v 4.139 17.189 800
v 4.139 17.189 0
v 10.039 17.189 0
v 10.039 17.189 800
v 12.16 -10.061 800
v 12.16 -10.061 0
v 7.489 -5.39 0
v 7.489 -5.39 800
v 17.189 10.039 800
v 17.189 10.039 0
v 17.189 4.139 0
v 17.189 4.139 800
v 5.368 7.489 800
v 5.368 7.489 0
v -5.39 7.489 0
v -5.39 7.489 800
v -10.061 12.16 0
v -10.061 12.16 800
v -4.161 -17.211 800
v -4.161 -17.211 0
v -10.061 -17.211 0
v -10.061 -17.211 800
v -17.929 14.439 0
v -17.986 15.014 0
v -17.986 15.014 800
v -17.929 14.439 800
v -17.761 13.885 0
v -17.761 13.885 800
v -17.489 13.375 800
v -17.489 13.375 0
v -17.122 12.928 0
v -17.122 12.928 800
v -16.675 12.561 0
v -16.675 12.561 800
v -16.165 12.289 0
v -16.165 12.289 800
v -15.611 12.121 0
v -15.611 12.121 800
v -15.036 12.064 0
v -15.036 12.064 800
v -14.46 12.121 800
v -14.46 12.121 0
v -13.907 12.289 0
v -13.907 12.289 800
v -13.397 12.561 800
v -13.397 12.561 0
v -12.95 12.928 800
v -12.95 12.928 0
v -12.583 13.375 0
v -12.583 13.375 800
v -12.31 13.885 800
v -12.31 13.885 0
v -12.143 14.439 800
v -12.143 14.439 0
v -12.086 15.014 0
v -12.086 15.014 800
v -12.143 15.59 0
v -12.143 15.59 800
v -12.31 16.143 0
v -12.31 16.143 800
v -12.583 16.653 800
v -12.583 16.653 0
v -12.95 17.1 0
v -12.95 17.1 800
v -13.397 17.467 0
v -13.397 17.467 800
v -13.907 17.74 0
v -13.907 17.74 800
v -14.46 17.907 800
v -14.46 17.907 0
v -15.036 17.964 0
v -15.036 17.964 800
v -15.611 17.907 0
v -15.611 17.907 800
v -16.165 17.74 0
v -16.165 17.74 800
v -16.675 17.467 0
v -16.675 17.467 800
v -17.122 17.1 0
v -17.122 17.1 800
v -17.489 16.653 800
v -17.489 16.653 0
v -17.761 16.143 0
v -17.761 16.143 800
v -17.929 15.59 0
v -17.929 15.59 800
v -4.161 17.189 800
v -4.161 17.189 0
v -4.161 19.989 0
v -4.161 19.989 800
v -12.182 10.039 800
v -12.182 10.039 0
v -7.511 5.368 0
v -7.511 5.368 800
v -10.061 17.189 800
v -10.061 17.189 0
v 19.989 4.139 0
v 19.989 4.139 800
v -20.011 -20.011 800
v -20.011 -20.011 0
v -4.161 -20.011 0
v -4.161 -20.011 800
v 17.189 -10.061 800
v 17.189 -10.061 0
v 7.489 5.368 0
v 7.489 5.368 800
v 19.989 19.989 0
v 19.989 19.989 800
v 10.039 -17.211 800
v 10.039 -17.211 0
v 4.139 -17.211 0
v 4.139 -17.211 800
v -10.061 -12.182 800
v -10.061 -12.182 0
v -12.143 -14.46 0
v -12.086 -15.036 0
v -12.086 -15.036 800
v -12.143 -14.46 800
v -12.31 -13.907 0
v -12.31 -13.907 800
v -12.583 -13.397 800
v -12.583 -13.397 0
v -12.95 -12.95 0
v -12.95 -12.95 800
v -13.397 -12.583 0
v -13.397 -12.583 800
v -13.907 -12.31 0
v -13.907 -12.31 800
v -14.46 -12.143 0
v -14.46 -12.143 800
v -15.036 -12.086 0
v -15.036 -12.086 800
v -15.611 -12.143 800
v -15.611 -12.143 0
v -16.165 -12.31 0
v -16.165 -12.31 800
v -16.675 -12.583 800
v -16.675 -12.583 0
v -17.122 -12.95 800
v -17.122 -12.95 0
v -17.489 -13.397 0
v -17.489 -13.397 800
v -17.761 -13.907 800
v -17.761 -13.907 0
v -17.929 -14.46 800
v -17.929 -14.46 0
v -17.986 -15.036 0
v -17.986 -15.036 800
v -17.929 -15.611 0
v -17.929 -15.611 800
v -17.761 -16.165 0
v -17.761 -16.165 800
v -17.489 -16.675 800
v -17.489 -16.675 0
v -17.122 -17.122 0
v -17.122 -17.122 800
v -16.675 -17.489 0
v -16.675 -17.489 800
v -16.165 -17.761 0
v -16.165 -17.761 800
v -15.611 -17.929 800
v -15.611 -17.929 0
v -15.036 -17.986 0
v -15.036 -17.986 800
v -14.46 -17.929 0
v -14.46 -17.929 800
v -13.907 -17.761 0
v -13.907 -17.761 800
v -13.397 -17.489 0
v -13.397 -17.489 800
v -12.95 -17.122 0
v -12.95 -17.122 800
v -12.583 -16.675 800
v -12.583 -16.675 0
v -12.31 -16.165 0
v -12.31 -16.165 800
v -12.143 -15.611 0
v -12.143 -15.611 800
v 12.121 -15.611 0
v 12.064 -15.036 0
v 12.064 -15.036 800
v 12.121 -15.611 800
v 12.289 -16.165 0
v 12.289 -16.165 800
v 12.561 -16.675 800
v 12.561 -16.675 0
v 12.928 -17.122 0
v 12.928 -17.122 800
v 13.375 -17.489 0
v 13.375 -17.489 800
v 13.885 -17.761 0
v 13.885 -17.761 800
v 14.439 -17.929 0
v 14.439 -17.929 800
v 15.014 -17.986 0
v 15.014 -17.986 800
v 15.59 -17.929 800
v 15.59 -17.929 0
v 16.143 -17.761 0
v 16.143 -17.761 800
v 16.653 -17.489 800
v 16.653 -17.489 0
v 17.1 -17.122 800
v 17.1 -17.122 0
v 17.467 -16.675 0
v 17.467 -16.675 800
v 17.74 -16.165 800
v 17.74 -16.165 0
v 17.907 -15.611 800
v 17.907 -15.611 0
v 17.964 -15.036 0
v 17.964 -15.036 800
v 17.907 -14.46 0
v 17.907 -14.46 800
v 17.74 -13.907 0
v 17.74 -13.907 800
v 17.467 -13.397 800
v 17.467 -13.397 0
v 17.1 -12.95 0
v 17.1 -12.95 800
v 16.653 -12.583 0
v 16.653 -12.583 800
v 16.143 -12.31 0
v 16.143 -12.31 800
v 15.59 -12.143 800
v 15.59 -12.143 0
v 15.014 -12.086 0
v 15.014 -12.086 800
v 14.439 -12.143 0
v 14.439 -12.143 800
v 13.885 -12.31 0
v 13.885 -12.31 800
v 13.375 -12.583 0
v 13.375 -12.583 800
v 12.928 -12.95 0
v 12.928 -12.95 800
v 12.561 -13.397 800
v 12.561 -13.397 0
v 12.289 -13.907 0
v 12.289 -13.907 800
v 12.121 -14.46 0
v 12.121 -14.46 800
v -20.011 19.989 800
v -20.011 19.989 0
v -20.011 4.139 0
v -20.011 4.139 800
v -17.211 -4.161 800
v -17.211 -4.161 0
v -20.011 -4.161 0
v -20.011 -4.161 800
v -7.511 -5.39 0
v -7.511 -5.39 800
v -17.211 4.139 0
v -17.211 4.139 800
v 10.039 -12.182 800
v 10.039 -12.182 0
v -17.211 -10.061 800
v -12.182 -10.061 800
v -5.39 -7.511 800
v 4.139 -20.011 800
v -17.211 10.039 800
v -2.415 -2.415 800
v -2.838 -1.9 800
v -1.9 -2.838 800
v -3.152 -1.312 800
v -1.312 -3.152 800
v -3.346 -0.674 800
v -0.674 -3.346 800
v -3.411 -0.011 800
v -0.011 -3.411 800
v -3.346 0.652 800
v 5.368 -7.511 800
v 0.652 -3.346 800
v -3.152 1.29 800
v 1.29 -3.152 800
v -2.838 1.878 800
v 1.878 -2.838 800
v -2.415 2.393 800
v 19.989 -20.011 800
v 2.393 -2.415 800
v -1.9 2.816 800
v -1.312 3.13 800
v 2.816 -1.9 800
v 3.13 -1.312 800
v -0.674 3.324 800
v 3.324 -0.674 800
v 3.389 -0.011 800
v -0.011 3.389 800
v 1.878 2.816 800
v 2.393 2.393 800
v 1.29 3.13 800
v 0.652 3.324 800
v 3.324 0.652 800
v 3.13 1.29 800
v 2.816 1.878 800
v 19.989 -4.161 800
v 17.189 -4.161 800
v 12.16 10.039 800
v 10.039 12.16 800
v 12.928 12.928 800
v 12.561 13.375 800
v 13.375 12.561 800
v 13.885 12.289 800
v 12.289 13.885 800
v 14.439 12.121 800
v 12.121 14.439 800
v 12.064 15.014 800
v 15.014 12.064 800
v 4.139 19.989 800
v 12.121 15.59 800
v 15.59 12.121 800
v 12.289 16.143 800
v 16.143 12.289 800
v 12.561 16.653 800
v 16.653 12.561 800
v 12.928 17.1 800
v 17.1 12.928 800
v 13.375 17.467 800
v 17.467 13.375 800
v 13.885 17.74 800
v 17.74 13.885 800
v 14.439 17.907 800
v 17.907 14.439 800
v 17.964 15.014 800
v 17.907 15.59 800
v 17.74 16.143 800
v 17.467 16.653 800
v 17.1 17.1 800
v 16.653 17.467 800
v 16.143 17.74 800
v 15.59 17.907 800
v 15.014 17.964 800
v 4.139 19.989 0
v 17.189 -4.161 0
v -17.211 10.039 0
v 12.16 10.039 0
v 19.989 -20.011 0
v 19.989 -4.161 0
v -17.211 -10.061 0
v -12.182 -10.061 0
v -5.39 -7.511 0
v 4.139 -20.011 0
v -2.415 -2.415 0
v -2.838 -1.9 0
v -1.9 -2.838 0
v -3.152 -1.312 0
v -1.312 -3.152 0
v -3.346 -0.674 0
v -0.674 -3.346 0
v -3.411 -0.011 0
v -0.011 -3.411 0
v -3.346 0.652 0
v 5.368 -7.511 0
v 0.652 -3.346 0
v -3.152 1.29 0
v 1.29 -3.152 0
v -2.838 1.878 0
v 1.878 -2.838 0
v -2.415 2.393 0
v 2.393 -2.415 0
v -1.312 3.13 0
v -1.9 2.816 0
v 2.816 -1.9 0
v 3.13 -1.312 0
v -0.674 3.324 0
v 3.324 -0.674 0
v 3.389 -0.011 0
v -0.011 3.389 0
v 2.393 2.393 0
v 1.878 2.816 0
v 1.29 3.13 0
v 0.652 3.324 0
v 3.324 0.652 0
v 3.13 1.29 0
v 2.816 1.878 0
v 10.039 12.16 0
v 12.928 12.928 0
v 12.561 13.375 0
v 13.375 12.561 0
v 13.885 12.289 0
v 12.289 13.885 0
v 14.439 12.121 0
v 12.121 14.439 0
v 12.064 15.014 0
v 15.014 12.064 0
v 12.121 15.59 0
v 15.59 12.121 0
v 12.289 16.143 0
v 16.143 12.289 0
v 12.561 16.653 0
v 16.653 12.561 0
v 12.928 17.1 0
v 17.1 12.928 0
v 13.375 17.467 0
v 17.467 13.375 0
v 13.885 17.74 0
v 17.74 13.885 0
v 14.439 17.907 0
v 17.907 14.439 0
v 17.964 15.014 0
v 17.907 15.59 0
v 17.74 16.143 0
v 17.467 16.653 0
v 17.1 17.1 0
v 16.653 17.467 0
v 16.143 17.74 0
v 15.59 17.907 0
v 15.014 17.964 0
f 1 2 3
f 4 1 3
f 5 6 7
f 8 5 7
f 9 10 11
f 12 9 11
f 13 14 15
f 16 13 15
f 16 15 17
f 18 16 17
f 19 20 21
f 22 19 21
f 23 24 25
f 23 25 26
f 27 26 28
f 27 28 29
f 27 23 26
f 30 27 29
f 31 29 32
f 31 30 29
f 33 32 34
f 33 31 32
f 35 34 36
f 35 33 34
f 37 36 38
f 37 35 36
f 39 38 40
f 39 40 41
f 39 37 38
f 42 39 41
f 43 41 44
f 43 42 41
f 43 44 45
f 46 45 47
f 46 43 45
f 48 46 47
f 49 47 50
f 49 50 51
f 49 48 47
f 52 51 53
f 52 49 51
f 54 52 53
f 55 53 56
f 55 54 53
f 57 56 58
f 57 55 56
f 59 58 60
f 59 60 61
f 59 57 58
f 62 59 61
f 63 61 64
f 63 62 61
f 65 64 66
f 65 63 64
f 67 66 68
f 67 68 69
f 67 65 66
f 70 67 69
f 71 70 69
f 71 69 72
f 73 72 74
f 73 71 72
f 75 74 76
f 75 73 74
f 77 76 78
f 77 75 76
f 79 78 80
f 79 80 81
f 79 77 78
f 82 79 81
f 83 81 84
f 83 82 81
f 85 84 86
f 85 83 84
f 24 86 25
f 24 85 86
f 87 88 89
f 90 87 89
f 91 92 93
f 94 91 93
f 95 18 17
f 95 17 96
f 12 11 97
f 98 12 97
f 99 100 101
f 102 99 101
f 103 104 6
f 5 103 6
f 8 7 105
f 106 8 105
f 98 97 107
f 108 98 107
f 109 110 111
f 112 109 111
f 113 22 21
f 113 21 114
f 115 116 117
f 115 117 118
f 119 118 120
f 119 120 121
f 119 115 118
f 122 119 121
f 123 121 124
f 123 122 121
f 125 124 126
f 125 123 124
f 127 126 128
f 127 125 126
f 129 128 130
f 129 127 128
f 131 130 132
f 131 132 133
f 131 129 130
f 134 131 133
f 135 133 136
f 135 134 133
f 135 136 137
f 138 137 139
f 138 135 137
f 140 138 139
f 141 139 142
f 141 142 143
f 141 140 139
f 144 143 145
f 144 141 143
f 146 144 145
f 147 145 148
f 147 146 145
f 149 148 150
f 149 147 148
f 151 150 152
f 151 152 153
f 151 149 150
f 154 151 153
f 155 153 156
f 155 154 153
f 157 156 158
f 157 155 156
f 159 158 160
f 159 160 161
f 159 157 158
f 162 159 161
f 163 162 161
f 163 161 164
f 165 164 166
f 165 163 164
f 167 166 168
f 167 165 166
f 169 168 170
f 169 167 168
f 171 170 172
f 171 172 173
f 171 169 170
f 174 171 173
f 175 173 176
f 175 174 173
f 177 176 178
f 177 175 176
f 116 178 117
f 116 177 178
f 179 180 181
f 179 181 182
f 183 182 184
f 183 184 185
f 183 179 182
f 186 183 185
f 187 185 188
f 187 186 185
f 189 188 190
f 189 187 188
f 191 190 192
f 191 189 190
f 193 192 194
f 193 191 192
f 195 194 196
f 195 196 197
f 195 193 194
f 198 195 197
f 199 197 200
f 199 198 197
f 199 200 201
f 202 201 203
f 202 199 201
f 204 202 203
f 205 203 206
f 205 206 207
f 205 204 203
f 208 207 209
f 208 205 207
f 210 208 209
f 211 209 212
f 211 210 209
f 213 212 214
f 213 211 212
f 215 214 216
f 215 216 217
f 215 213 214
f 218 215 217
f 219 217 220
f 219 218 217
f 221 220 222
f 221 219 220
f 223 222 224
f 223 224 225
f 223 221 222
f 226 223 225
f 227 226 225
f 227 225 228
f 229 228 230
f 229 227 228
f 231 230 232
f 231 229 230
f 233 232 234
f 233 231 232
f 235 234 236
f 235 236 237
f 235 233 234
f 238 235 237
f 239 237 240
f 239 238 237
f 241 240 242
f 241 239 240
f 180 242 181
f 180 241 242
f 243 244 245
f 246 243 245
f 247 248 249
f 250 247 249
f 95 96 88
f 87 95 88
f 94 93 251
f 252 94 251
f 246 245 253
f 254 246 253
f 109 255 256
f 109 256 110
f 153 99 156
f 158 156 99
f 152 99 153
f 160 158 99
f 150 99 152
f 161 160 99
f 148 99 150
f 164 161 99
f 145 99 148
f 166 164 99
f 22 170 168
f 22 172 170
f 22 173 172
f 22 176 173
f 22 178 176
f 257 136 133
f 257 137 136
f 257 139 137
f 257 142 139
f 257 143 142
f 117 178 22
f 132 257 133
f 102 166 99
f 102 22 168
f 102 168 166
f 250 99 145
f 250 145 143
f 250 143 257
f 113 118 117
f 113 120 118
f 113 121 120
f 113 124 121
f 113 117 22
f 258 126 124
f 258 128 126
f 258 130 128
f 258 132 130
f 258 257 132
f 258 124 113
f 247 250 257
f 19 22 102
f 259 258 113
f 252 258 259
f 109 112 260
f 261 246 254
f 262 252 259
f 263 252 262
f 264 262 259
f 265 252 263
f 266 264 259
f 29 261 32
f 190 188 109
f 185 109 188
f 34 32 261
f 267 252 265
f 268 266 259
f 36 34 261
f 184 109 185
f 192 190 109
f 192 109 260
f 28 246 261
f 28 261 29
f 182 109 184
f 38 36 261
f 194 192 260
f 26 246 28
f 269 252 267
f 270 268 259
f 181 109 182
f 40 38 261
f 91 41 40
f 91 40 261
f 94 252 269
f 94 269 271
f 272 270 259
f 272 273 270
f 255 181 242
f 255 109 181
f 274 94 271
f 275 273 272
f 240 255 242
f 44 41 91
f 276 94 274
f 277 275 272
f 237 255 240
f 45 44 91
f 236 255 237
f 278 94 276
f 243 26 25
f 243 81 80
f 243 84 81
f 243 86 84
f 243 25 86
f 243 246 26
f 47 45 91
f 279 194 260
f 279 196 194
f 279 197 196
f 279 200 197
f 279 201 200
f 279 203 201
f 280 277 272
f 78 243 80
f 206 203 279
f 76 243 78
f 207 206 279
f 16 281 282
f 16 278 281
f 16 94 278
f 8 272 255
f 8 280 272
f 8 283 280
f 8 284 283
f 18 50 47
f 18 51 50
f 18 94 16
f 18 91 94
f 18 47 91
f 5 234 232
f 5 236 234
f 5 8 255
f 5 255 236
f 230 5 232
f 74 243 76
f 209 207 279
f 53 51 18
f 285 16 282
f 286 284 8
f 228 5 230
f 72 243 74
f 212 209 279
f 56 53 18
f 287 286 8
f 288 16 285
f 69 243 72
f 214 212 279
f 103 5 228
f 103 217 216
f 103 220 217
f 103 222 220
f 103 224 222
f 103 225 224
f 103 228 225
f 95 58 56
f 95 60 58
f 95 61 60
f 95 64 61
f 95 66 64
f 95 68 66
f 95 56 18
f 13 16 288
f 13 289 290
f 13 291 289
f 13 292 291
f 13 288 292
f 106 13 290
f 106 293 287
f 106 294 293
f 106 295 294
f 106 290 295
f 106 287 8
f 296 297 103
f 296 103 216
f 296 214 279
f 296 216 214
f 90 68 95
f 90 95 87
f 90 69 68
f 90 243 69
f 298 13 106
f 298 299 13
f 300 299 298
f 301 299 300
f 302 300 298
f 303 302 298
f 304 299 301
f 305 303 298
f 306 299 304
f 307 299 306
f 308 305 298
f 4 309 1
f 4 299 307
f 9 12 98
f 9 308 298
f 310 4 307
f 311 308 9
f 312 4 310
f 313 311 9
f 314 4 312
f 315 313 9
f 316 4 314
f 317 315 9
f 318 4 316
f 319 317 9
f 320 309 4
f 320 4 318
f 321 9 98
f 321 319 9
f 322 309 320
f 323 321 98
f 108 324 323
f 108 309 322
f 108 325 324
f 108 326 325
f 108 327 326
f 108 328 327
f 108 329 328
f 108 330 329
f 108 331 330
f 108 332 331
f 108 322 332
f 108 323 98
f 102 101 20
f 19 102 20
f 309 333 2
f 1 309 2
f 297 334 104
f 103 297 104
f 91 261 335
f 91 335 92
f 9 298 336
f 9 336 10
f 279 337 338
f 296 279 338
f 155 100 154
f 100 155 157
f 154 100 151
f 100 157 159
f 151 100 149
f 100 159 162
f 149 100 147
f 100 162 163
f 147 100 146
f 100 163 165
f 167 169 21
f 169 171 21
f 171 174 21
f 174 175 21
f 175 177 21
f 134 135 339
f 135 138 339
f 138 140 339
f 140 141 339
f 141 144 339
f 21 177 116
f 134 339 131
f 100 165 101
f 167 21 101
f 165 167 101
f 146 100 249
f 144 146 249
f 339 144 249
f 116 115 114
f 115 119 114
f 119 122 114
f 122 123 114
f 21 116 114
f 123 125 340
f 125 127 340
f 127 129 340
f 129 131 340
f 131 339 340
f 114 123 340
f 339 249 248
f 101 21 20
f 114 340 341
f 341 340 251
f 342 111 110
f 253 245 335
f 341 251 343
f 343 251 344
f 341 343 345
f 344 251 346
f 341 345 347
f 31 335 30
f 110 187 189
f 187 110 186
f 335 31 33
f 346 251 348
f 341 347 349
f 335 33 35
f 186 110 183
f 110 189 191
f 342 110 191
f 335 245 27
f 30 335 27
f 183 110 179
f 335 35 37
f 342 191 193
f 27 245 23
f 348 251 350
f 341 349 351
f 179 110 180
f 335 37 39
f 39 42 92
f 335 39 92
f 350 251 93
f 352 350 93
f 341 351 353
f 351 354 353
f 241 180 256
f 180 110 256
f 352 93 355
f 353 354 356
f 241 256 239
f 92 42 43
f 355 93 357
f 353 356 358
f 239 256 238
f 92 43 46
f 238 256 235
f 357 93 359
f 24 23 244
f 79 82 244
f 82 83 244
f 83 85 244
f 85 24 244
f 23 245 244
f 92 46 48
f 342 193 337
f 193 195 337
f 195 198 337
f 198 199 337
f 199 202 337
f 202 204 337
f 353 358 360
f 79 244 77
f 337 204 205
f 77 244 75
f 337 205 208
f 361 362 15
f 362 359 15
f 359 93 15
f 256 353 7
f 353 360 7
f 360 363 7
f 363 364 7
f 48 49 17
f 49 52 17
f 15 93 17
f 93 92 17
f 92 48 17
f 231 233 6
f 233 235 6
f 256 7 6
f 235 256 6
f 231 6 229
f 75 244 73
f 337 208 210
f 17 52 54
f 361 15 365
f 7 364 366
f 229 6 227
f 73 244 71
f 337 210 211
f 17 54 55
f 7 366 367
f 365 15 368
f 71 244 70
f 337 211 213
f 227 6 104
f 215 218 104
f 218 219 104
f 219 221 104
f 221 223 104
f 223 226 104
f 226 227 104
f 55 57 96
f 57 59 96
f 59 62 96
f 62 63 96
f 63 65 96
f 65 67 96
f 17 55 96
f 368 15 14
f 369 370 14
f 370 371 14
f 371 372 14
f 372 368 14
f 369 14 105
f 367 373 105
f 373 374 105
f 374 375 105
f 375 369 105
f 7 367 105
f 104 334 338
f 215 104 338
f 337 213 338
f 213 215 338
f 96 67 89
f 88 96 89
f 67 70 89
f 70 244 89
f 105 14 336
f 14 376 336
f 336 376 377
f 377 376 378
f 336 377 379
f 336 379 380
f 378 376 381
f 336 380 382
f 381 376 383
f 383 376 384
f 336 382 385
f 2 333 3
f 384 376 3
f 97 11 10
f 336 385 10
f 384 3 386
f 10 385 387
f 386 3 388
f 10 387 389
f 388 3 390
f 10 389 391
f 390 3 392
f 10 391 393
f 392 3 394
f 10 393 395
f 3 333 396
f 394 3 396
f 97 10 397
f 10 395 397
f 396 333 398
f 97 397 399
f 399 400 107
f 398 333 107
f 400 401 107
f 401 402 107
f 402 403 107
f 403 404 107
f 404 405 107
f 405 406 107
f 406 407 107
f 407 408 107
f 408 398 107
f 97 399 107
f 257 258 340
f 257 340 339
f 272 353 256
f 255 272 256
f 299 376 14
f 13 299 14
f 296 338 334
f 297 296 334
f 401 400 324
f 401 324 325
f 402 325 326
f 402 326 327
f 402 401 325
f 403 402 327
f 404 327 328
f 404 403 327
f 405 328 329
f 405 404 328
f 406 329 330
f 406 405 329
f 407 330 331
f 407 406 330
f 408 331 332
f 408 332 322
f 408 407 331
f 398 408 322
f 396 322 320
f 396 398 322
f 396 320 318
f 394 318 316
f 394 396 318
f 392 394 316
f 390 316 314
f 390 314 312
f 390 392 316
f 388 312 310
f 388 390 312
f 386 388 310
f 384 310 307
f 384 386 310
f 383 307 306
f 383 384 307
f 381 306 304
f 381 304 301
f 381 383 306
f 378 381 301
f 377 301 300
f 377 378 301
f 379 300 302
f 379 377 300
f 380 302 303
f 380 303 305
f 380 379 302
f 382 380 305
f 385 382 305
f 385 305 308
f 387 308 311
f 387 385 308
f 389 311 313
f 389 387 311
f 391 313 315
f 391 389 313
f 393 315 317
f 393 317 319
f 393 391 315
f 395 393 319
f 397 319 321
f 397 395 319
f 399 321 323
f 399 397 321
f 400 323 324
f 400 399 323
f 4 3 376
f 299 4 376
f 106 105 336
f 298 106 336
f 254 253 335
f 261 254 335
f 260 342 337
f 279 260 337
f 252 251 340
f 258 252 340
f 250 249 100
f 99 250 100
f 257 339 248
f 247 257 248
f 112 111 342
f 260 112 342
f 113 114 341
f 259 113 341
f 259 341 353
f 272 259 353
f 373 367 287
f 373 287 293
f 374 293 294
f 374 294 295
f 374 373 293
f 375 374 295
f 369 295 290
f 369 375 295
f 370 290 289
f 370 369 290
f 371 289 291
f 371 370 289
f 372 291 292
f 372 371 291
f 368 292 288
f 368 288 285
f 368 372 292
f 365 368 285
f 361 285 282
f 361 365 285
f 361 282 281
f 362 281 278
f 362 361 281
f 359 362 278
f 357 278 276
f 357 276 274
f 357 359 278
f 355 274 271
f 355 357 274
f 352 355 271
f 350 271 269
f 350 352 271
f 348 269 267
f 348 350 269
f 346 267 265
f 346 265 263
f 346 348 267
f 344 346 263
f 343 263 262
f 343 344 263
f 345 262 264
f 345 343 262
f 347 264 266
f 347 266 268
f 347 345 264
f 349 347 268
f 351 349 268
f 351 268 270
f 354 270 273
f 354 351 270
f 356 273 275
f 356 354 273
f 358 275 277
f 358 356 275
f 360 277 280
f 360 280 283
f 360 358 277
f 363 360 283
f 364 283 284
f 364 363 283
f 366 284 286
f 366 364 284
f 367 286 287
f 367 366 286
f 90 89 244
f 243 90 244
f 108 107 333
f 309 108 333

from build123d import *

# Parameters (mm, degrees)
SKETCH_1_R      = 3.4
SKETCH_1_R_2    = 2.95
EXTRUDE_1_DEPTH = 800


with BuildPart() as part:
    # 草图1 → 凸台-拉伸1 (new body)
    with BuildSketch(Plane.XY):
        Polygon((-5.389528684, -7.510849028), (5.367830629, -7.510849028), (10.039150972, -12.182169371), (10.039150972, -17.210849028), (4.139150972, -17.210849028), (4.139150972, -20.010849028), (19.989150972, -20.010849028), (19.989150972, -4.160849028), (17.189150972, -4.160849028), (17.189150972, -10.060849028), (12.160471316, -10.060849028), (7.489150972, -5.389528684), (7.489150972, 5.367830629), (12.160471316, 10.039150972), (17.189150972, 10.039150972), (17.189150972, 4.139150972), (19.989150972, 4.139150972), (19.989150972, 19.989150972), (4.139150972, 19.989150972), (4.139150972, 17.189150972), (10.039150972, 17.189150972), (10.039150972, 12.160471316), (5.367830629, 7.489150972), (-5.389528684, 7.489150972), (-10.060849028, 12.160471316), (-10.060849028, 17.189150972), (-4.160849028, 17.189150972), (-4.160849028, 19.989150972), (-20.010849028, 19.989150972), (-20.010849028, 4.139150972), (-17.210849028, 4.139150972), (-17.210849028, 10.039150972), (-12.182169371, 10.039150972), (-7.510849028, 5.367830629), (-7.510849028, -5.389528684), (-12.182169371, -10.060849028), (-17.210849028, -10.060849028), (-17.210849028, -4.160849028), (-20.010849028, -4.160849028), (-20.010849028, -20.010849028), (-4.160849028, -20.010849028), (-4.160849028, -17.210849028), (-10.060849028, -17.210849028), (-10.060849028, -12.182169371), align=None)
        with Locations((-0.010849028, -0.010849028)):
            Circle(SKETCH_1_R, mode=Mode.SUBTRACT)
        with Locations((15.014150972, 15.014150972)):
            Circle(SKETCH_1_R_2, mode=Mode.SUBTRACT)
        with Locations(Location((-15.035849028, 15.014150972, 0), (0, 0, 180))):
            Circle(SKETCH_1_R_2, mode=Mode.SUBTRACT)
        with Locations((-15.035849028, -15.035849028)):
            Circle(SKETCH_1_R_2, mode=Mode.SUBTRACT)
        with Locations(Location((15.014150972, -15.035849028, 0), (0, 0, 180))):
            Circle(SKETCH_1_R_2, mode=Mode.SUBTRACT)
    extrude(amount=EXTRUDE_1_DEPTH)


solid = part.part
